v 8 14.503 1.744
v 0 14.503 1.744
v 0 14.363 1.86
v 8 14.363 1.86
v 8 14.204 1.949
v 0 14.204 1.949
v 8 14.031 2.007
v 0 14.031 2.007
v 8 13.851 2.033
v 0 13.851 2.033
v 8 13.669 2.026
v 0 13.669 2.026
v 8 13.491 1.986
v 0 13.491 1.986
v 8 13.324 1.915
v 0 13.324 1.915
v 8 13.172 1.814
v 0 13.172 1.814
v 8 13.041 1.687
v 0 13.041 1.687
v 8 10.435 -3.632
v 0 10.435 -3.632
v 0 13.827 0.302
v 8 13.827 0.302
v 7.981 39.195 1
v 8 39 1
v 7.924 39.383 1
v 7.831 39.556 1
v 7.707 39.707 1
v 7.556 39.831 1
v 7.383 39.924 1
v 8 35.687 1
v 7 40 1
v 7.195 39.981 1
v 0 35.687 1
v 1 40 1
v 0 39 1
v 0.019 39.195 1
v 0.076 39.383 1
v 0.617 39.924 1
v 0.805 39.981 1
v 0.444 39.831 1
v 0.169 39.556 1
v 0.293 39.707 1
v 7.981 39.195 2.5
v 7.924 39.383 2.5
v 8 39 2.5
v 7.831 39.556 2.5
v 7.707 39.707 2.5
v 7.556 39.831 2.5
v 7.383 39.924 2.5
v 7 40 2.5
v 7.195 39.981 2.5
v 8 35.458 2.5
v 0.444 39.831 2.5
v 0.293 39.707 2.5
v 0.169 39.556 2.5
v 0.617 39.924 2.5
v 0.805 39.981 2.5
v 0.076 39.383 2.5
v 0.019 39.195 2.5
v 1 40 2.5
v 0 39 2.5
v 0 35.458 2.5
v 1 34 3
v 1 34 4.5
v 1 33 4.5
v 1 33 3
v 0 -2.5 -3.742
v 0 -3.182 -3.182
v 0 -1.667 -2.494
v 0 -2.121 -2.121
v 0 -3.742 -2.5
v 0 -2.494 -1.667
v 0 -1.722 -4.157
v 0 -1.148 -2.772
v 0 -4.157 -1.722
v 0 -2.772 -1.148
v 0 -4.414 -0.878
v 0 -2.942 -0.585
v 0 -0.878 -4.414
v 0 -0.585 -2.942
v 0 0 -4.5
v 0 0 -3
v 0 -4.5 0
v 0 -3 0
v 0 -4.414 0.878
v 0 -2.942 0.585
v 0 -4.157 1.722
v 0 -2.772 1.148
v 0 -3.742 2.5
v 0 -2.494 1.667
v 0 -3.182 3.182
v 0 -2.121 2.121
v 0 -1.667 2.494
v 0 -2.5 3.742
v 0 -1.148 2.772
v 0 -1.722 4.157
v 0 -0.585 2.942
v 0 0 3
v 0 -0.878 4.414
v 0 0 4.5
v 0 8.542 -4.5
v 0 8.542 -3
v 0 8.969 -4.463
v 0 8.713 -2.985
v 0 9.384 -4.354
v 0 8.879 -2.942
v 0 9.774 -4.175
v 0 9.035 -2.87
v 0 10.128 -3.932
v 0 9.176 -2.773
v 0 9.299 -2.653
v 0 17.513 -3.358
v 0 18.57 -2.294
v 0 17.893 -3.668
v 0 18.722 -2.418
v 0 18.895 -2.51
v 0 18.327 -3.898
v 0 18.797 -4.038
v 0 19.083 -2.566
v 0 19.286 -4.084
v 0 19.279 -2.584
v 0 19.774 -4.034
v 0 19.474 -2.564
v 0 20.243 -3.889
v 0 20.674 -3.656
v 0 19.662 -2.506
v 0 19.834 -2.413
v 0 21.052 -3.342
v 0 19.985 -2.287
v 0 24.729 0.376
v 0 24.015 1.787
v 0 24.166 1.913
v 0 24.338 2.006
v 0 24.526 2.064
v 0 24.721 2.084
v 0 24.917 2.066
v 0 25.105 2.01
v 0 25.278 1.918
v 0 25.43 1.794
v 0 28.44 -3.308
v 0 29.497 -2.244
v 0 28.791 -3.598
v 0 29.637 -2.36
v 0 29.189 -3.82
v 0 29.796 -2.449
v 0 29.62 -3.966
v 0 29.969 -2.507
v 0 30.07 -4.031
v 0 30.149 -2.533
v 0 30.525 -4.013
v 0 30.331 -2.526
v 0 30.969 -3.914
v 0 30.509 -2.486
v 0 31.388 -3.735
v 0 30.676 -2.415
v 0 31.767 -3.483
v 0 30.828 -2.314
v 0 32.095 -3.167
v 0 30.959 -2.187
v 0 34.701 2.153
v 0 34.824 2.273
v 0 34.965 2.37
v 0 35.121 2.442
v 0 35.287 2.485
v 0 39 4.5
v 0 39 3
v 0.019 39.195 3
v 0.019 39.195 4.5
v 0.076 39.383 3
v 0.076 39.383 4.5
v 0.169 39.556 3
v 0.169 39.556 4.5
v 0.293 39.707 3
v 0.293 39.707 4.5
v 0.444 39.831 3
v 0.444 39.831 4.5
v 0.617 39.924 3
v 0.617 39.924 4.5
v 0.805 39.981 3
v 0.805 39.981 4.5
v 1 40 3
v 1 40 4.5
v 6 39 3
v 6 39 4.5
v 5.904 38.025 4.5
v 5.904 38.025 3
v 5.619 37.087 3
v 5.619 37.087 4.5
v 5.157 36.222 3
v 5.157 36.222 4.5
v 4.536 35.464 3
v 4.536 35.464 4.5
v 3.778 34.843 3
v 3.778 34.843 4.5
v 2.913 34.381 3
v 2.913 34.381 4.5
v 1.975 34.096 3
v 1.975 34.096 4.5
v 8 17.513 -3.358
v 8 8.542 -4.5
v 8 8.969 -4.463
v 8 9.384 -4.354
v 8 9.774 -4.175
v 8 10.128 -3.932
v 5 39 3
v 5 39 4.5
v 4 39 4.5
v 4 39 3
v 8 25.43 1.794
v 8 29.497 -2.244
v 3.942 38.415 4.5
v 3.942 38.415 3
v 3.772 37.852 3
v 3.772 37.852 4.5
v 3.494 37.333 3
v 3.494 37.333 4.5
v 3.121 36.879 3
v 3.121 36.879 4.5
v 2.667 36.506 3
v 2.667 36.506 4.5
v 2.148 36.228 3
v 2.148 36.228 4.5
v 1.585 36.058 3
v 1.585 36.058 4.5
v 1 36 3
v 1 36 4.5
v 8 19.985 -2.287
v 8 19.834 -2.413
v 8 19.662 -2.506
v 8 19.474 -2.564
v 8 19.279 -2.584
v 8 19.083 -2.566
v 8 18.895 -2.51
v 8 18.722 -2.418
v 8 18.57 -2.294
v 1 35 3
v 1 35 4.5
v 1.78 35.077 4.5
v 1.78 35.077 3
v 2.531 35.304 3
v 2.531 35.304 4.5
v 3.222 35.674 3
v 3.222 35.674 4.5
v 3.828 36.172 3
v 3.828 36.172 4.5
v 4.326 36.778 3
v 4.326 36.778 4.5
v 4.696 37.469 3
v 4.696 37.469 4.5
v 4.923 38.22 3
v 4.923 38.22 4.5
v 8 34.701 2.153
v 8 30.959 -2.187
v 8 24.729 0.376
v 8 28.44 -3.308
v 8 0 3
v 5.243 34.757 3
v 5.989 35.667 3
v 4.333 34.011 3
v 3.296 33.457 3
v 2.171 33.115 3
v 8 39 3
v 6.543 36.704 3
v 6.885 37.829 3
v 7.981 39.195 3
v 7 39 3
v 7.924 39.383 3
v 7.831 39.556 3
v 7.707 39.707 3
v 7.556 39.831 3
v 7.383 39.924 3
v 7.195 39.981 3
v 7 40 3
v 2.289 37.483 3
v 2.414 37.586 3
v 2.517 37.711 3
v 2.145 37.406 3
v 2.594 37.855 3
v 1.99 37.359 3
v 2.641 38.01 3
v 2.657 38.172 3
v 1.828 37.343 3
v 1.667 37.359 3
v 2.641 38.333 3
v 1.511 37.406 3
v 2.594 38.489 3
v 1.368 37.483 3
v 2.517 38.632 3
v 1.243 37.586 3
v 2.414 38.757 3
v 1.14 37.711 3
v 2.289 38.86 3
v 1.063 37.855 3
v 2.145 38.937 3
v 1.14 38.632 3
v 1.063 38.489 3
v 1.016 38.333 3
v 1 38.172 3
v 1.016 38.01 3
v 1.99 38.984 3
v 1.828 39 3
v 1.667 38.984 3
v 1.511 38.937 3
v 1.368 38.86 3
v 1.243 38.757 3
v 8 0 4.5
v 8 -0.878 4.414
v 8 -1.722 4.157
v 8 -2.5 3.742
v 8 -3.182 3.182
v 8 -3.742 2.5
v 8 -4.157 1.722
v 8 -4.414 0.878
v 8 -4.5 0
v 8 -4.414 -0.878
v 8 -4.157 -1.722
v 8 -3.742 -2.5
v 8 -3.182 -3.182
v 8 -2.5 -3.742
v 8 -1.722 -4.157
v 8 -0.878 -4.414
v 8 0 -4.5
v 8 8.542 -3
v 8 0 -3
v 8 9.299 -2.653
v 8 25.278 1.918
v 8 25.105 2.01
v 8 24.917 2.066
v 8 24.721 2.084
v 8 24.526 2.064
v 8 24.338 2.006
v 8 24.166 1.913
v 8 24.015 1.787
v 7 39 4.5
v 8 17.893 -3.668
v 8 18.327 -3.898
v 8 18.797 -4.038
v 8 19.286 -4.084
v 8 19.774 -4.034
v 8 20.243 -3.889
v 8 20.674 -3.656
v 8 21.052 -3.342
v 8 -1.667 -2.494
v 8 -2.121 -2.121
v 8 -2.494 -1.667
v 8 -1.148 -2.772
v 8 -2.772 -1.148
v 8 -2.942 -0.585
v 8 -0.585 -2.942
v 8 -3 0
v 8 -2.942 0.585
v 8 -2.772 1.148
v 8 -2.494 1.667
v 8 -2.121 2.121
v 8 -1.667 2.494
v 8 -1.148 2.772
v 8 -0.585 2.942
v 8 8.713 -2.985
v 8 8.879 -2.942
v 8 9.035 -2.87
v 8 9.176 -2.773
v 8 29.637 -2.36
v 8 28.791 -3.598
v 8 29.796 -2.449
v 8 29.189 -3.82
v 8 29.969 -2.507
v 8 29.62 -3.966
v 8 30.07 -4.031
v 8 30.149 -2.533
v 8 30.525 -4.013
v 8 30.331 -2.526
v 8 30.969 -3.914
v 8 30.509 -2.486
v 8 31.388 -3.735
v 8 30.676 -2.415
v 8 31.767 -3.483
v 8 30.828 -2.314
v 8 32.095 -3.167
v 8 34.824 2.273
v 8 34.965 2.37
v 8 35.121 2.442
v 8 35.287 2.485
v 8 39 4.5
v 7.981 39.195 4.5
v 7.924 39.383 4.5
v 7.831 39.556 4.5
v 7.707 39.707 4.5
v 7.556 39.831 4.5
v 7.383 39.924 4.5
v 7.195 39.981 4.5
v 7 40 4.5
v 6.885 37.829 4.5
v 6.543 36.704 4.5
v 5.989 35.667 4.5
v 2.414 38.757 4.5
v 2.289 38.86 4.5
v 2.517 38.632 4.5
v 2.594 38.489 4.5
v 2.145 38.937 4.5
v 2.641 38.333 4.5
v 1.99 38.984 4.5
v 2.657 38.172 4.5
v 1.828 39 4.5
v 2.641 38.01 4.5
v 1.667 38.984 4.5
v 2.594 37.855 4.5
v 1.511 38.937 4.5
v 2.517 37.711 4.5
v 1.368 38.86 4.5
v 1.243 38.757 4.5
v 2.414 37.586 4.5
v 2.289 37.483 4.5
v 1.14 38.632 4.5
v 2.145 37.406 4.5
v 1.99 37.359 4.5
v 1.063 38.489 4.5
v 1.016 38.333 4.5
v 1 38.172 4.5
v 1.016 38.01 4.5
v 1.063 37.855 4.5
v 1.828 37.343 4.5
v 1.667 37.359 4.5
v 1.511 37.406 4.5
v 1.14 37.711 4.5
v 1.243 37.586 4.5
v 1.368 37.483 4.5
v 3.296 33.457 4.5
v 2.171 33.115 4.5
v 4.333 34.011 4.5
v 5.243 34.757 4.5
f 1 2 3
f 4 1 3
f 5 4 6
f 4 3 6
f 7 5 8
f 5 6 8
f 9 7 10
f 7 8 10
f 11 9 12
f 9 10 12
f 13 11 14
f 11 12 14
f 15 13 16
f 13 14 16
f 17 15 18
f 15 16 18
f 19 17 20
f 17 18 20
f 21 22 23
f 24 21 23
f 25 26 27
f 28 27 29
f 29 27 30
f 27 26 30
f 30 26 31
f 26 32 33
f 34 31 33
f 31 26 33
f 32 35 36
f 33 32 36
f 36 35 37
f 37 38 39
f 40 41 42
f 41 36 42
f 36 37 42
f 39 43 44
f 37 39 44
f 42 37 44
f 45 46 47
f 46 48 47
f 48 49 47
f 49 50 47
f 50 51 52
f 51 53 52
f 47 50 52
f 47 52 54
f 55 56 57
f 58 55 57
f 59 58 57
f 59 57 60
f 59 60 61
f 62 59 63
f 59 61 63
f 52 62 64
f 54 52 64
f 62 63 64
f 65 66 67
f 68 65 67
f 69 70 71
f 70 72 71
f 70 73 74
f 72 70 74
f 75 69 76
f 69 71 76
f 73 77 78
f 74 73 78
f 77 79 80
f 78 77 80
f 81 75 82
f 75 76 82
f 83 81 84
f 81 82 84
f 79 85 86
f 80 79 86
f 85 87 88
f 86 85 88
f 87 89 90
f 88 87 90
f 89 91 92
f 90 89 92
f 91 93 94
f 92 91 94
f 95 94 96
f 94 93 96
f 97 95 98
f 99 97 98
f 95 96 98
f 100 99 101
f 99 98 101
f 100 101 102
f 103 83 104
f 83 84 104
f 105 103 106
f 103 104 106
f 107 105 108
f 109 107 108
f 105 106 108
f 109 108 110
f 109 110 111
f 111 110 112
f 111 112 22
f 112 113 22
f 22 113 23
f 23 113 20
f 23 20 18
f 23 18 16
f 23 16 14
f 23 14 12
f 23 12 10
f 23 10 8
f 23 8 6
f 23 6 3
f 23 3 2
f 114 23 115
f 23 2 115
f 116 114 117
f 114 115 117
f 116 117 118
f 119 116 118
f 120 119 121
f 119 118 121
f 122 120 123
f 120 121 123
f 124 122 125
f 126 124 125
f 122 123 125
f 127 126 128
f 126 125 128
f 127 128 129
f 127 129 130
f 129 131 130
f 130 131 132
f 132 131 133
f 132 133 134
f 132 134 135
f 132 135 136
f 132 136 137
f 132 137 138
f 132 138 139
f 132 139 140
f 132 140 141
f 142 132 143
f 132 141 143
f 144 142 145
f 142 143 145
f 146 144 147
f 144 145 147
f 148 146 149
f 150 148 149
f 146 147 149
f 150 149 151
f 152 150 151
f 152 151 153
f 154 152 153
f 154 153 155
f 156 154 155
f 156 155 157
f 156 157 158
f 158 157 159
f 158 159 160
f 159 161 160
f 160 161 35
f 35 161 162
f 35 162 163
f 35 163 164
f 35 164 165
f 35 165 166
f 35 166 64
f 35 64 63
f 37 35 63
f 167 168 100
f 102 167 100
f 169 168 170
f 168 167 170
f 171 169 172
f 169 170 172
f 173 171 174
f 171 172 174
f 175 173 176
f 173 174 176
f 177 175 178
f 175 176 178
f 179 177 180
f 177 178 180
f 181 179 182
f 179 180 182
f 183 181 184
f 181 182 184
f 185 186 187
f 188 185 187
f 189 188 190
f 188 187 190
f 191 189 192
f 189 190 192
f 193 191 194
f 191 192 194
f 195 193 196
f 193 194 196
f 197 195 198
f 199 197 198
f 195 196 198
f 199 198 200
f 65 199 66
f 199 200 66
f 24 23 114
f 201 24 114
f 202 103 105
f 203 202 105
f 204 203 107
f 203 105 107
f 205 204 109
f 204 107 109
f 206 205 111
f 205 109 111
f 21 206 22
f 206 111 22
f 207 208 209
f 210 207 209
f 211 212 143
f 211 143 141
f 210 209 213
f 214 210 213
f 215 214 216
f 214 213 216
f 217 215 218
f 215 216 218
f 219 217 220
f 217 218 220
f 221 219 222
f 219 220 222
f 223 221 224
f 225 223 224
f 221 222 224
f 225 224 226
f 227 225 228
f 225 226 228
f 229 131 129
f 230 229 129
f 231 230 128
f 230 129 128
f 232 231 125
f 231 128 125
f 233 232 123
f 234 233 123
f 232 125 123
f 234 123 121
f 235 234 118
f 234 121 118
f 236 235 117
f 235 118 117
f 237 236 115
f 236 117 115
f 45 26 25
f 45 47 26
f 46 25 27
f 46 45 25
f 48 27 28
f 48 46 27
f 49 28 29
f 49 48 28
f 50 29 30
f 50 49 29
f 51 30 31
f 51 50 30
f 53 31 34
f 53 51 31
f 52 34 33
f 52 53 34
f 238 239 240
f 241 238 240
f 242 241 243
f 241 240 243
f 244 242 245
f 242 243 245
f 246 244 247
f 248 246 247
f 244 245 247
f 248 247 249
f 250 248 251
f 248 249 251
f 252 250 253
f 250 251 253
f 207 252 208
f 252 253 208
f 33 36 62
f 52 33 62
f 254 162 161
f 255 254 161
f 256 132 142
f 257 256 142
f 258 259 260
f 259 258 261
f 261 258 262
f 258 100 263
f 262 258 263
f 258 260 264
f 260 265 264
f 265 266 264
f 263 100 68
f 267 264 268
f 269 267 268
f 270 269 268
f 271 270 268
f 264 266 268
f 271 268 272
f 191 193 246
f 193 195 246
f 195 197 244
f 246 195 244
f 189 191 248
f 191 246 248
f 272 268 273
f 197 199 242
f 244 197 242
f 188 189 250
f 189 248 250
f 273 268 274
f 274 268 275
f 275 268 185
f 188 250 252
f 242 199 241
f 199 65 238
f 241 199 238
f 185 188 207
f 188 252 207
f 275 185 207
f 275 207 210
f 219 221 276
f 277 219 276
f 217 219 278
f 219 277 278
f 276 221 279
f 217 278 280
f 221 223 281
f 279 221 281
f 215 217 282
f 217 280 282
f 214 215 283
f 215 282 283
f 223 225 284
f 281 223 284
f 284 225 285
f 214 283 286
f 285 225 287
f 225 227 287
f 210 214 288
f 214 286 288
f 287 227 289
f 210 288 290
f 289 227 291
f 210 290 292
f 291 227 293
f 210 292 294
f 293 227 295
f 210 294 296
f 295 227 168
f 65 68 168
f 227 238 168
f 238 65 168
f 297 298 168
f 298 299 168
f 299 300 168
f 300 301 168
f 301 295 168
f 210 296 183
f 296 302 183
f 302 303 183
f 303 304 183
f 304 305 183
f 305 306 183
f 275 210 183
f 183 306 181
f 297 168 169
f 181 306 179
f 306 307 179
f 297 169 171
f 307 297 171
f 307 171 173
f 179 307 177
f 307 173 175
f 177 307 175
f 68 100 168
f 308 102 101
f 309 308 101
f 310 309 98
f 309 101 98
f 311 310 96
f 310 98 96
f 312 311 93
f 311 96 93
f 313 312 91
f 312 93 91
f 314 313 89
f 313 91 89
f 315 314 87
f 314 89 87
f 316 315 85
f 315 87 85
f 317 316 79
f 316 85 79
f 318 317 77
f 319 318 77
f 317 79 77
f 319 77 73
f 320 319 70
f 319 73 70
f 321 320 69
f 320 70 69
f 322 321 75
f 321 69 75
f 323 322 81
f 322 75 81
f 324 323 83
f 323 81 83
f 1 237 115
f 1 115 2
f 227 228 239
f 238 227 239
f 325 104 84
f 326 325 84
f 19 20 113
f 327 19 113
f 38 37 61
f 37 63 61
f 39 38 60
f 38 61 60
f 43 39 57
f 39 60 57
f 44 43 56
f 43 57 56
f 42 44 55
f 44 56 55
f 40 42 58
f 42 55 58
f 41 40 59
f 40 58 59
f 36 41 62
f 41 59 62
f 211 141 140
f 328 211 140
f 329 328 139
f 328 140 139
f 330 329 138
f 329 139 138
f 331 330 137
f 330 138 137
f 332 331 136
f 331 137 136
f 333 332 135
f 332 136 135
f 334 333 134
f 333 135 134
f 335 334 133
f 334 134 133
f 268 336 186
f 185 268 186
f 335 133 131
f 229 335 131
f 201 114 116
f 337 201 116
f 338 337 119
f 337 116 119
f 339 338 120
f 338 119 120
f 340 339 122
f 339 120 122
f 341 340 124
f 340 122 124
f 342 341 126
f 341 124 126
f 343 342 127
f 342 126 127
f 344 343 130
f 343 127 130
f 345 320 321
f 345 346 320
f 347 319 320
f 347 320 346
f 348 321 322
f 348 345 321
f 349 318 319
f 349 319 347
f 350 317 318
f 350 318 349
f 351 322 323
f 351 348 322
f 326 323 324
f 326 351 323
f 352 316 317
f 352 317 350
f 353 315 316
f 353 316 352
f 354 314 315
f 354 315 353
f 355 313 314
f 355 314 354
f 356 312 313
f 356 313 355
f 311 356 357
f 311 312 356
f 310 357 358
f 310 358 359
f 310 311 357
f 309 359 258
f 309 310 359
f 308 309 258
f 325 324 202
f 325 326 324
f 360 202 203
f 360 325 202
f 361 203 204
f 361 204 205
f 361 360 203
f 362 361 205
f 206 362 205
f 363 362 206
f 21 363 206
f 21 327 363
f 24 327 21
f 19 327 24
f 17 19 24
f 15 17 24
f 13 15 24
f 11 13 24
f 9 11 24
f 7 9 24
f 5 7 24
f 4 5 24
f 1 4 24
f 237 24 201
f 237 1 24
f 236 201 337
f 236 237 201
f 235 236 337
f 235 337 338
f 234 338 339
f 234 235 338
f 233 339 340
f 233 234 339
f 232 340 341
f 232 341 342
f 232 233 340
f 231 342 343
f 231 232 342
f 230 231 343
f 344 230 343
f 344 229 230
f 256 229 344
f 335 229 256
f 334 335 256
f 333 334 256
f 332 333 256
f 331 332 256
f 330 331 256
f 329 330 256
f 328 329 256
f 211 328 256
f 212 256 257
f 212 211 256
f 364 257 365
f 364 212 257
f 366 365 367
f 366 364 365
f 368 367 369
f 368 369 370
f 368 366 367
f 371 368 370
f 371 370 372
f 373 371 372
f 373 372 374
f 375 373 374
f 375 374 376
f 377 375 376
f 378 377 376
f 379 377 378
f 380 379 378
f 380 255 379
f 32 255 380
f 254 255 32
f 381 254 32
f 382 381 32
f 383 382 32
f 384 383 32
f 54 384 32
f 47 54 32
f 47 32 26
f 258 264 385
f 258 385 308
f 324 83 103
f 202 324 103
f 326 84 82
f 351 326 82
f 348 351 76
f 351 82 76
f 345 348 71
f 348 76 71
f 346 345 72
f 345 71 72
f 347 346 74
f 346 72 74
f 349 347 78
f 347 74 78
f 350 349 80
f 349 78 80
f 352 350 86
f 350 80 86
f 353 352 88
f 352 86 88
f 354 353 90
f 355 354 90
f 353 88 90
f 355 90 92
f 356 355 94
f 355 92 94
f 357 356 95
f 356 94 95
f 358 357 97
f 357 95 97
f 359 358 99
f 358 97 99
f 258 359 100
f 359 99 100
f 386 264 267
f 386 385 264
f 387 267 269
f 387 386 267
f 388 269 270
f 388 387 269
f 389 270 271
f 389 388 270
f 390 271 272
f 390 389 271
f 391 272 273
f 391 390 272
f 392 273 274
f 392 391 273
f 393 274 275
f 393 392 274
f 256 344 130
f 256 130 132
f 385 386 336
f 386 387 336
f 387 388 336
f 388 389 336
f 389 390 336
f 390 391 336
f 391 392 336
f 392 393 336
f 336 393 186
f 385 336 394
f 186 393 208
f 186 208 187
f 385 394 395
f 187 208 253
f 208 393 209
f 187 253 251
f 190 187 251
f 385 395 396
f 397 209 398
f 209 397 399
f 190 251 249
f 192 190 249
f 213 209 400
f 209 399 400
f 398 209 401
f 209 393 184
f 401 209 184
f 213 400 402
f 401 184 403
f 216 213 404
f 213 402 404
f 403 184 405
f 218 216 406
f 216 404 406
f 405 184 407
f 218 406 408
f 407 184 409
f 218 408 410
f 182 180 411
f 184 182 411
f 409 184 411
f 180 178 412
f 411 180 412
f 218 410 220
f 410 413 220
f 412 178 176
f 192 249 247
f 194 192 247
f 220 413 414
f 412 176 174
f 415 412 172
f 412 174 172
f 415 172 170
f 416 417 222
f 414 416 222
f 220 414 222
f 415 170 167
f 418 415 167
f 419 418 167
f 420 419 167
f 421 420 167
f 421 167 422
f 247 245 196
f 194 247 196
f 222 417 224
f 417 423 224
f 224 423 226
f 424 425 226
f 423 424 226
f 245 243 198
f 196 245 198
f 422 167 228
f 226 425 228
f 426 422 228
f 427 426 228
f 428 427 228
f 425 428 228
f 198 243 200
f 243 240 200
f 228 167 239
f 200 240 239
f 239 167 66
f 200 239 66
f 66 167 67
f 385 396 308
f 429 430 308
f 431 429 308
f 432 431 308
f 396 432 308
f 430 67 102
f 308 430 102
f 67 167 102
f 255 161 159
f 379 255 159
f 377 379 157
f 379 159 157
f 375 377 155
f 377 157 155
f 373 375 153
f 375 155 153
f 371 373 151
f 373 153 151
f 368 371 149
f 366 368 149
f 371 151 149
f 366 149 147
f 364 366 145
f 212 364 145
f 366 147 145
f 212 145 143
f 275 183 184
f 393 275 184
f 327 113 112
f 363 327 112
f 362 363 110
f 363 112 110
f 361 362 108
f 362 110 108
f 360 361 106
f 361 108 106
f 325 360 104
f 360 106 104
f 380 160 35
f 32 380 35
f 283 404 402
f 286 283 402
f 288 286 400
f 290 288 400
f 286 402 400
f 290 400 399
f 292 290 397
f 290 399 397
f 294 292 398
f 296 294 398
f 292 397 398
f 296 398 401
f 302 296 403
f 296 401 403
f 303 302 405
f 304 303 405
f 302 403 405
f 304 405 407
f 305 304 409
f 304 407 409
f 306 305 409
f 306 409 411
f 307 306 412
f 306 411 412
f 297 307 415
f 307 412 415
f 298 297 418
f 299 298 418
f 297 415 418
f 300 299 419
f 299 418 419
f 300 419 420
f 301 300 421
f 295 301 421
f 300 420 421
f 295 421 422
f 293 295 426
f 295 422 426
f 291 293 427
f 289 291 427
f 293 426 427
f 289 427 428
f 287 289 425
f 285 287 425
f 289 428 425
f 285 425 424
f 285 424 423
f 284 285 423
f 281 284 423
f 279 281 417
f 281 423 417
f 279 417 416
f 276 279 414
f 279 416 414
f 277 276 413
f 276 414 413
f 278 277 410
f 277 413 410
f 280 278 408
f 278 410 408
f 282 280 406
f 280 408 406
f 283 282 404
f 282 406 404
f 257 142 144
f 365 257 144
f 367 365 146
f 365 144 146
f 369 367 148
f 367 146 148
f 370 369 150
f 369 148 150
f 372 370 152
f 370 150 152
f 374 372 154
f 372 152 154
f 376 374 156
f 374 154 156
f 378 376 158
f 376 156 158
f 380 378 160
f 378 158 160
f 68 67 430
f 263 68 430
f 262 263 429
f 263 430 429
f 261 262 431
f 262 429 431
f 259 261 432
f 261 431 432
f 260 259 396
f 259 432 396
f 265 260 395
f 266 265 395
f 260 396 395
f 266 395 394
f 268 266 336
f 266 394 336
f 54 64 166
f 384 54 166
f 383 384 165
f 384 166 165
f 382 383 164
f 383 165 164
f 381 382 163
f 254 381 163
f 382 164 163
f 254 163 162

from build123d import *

# Parameters (mm, degrees)
F1_DEPTH = 8
F2_R     = 0.828427
F3_DEPTH = 1.5
F4_R     = 1


with BuildPart() as f1:
    # F0 (on Right) → F1 (new body)
    with BuildSketch(Plane.YZ):
        with BuildLine():
            ThreePointArc((0, -3), (-3, 0), (0, 3))
            Line((0, 3), (40, 3))
            Line((40, 3), (40, 4.5))
            Line((40, 4.5), (0, 4.5))
            ThreePointArc((0, 4.5), (-4.5, 0), (0, -4.5))
            Line((0, -4.5), (8.541805, -4.5))
            ThreePointArc((8.541805, -4.5), (9.583182, -4.272781), (10.435262, -3.632429))
            Line((10.435262, -3.632429), (13.826929, 0.301572))
            Line((13.826929, 0.301572), (17.512715, -3.358312))
            ThreePointArc((17.512715, -3.358312), (19.285663, -4.084296), (21.051901, -3.342136))
            Line((21.051901, -3.342136), (24.728998, 0.376483))
            Line((24.728998, 0.376483), (28.439931, -3.30837))
            ThreePointArc((28.439931, -3.30837), (30.298208, -4.032508), (32.09491, -3.16681))
            Line((32.09491, -3.16681), (35.687292, 1))
            Line((35.687292, 1), (40, 1))
            Line((40, 1), (40, 2.5))
            Line((40, 2.5), (35.458195, 2.5))
            ThreePointArc((35.458195, 2.5), (35.041644, 2.409113), (34.700812, 2.152971))
            Line((34.700812, 2.152971), (30.958836, -2.187352))
            ThreePointArc((30.958836, -2.187352), (30.240155, -2.533632), (29.496844, -2.243977))
            Line((29.496844, -2.243977), (25.430372, 1.793918))
            ThreePointArc((25.430372, 1.793918), (24.721192, 2.084312), (24.014697, 1.787448))
            Line((24.014697, 1.787448), (19.985303, -2.287448))
            ThreePointArc((19.985303, -2.287448), (19.278808, -2.584312), (18.569628, -2.293918))
            Line((18.569628, -2.293918), (14.503156, 1.743977))
            ThreePointArc((14.503156, 1.743977), (13.759845, 2.033632), (13.041164, 1.687352))
            Line((13.041164, 1.687352), (9.299188, -2.652971))
            ThreePointArc((9.299188, -2.652971), (8.958356, -2.909113), (8.541805, -3))
            Line((8.541805, -3), (0, -3))
        make_face()
    extrude(amount=F1_DEPTH)

    # F2 (on face) → F3 (cut, through all)
    with BuildSketch(Plane.XY.offset(4.5)):
        with BuildLine():
            ThreePointArc((4, 39), (3.12132, 36.87868), (1, 36))
            Line((1, 36), (1, 35))
            ThreePointArc((1, 35), (3.828427, 36.171573), (5, 39))
            Line((5, 39), (4, 39))
        make_face()
        with BuildLine():
            ThreePointArc((6, 39), (4.535534, 35.464466), (1, 34))
            Line((1, 34), (1, 33))
            ThreePointArc((1, 33), (5.242641, 34.757359), (7, 39))
            Line((7, 39), (6, 39))
        make_face()
        with Locations((1.828427, 38.171573)):
            Circle(F2_R)
    extrude(amount=-F3_DEPTH, mode=Mode.SUBTRACT)

    # F4
    f4_edges = [f1.edges().sort_by_distance(p)[0] for p in [
        (8, 40, 3.75),
        (8, 40, 1.75),
        (0, 40, 1.75),
        (0, 40, 3.75),
    ]]
    fillet(f4_edges, radius=F4_R)


solid = f1.part
